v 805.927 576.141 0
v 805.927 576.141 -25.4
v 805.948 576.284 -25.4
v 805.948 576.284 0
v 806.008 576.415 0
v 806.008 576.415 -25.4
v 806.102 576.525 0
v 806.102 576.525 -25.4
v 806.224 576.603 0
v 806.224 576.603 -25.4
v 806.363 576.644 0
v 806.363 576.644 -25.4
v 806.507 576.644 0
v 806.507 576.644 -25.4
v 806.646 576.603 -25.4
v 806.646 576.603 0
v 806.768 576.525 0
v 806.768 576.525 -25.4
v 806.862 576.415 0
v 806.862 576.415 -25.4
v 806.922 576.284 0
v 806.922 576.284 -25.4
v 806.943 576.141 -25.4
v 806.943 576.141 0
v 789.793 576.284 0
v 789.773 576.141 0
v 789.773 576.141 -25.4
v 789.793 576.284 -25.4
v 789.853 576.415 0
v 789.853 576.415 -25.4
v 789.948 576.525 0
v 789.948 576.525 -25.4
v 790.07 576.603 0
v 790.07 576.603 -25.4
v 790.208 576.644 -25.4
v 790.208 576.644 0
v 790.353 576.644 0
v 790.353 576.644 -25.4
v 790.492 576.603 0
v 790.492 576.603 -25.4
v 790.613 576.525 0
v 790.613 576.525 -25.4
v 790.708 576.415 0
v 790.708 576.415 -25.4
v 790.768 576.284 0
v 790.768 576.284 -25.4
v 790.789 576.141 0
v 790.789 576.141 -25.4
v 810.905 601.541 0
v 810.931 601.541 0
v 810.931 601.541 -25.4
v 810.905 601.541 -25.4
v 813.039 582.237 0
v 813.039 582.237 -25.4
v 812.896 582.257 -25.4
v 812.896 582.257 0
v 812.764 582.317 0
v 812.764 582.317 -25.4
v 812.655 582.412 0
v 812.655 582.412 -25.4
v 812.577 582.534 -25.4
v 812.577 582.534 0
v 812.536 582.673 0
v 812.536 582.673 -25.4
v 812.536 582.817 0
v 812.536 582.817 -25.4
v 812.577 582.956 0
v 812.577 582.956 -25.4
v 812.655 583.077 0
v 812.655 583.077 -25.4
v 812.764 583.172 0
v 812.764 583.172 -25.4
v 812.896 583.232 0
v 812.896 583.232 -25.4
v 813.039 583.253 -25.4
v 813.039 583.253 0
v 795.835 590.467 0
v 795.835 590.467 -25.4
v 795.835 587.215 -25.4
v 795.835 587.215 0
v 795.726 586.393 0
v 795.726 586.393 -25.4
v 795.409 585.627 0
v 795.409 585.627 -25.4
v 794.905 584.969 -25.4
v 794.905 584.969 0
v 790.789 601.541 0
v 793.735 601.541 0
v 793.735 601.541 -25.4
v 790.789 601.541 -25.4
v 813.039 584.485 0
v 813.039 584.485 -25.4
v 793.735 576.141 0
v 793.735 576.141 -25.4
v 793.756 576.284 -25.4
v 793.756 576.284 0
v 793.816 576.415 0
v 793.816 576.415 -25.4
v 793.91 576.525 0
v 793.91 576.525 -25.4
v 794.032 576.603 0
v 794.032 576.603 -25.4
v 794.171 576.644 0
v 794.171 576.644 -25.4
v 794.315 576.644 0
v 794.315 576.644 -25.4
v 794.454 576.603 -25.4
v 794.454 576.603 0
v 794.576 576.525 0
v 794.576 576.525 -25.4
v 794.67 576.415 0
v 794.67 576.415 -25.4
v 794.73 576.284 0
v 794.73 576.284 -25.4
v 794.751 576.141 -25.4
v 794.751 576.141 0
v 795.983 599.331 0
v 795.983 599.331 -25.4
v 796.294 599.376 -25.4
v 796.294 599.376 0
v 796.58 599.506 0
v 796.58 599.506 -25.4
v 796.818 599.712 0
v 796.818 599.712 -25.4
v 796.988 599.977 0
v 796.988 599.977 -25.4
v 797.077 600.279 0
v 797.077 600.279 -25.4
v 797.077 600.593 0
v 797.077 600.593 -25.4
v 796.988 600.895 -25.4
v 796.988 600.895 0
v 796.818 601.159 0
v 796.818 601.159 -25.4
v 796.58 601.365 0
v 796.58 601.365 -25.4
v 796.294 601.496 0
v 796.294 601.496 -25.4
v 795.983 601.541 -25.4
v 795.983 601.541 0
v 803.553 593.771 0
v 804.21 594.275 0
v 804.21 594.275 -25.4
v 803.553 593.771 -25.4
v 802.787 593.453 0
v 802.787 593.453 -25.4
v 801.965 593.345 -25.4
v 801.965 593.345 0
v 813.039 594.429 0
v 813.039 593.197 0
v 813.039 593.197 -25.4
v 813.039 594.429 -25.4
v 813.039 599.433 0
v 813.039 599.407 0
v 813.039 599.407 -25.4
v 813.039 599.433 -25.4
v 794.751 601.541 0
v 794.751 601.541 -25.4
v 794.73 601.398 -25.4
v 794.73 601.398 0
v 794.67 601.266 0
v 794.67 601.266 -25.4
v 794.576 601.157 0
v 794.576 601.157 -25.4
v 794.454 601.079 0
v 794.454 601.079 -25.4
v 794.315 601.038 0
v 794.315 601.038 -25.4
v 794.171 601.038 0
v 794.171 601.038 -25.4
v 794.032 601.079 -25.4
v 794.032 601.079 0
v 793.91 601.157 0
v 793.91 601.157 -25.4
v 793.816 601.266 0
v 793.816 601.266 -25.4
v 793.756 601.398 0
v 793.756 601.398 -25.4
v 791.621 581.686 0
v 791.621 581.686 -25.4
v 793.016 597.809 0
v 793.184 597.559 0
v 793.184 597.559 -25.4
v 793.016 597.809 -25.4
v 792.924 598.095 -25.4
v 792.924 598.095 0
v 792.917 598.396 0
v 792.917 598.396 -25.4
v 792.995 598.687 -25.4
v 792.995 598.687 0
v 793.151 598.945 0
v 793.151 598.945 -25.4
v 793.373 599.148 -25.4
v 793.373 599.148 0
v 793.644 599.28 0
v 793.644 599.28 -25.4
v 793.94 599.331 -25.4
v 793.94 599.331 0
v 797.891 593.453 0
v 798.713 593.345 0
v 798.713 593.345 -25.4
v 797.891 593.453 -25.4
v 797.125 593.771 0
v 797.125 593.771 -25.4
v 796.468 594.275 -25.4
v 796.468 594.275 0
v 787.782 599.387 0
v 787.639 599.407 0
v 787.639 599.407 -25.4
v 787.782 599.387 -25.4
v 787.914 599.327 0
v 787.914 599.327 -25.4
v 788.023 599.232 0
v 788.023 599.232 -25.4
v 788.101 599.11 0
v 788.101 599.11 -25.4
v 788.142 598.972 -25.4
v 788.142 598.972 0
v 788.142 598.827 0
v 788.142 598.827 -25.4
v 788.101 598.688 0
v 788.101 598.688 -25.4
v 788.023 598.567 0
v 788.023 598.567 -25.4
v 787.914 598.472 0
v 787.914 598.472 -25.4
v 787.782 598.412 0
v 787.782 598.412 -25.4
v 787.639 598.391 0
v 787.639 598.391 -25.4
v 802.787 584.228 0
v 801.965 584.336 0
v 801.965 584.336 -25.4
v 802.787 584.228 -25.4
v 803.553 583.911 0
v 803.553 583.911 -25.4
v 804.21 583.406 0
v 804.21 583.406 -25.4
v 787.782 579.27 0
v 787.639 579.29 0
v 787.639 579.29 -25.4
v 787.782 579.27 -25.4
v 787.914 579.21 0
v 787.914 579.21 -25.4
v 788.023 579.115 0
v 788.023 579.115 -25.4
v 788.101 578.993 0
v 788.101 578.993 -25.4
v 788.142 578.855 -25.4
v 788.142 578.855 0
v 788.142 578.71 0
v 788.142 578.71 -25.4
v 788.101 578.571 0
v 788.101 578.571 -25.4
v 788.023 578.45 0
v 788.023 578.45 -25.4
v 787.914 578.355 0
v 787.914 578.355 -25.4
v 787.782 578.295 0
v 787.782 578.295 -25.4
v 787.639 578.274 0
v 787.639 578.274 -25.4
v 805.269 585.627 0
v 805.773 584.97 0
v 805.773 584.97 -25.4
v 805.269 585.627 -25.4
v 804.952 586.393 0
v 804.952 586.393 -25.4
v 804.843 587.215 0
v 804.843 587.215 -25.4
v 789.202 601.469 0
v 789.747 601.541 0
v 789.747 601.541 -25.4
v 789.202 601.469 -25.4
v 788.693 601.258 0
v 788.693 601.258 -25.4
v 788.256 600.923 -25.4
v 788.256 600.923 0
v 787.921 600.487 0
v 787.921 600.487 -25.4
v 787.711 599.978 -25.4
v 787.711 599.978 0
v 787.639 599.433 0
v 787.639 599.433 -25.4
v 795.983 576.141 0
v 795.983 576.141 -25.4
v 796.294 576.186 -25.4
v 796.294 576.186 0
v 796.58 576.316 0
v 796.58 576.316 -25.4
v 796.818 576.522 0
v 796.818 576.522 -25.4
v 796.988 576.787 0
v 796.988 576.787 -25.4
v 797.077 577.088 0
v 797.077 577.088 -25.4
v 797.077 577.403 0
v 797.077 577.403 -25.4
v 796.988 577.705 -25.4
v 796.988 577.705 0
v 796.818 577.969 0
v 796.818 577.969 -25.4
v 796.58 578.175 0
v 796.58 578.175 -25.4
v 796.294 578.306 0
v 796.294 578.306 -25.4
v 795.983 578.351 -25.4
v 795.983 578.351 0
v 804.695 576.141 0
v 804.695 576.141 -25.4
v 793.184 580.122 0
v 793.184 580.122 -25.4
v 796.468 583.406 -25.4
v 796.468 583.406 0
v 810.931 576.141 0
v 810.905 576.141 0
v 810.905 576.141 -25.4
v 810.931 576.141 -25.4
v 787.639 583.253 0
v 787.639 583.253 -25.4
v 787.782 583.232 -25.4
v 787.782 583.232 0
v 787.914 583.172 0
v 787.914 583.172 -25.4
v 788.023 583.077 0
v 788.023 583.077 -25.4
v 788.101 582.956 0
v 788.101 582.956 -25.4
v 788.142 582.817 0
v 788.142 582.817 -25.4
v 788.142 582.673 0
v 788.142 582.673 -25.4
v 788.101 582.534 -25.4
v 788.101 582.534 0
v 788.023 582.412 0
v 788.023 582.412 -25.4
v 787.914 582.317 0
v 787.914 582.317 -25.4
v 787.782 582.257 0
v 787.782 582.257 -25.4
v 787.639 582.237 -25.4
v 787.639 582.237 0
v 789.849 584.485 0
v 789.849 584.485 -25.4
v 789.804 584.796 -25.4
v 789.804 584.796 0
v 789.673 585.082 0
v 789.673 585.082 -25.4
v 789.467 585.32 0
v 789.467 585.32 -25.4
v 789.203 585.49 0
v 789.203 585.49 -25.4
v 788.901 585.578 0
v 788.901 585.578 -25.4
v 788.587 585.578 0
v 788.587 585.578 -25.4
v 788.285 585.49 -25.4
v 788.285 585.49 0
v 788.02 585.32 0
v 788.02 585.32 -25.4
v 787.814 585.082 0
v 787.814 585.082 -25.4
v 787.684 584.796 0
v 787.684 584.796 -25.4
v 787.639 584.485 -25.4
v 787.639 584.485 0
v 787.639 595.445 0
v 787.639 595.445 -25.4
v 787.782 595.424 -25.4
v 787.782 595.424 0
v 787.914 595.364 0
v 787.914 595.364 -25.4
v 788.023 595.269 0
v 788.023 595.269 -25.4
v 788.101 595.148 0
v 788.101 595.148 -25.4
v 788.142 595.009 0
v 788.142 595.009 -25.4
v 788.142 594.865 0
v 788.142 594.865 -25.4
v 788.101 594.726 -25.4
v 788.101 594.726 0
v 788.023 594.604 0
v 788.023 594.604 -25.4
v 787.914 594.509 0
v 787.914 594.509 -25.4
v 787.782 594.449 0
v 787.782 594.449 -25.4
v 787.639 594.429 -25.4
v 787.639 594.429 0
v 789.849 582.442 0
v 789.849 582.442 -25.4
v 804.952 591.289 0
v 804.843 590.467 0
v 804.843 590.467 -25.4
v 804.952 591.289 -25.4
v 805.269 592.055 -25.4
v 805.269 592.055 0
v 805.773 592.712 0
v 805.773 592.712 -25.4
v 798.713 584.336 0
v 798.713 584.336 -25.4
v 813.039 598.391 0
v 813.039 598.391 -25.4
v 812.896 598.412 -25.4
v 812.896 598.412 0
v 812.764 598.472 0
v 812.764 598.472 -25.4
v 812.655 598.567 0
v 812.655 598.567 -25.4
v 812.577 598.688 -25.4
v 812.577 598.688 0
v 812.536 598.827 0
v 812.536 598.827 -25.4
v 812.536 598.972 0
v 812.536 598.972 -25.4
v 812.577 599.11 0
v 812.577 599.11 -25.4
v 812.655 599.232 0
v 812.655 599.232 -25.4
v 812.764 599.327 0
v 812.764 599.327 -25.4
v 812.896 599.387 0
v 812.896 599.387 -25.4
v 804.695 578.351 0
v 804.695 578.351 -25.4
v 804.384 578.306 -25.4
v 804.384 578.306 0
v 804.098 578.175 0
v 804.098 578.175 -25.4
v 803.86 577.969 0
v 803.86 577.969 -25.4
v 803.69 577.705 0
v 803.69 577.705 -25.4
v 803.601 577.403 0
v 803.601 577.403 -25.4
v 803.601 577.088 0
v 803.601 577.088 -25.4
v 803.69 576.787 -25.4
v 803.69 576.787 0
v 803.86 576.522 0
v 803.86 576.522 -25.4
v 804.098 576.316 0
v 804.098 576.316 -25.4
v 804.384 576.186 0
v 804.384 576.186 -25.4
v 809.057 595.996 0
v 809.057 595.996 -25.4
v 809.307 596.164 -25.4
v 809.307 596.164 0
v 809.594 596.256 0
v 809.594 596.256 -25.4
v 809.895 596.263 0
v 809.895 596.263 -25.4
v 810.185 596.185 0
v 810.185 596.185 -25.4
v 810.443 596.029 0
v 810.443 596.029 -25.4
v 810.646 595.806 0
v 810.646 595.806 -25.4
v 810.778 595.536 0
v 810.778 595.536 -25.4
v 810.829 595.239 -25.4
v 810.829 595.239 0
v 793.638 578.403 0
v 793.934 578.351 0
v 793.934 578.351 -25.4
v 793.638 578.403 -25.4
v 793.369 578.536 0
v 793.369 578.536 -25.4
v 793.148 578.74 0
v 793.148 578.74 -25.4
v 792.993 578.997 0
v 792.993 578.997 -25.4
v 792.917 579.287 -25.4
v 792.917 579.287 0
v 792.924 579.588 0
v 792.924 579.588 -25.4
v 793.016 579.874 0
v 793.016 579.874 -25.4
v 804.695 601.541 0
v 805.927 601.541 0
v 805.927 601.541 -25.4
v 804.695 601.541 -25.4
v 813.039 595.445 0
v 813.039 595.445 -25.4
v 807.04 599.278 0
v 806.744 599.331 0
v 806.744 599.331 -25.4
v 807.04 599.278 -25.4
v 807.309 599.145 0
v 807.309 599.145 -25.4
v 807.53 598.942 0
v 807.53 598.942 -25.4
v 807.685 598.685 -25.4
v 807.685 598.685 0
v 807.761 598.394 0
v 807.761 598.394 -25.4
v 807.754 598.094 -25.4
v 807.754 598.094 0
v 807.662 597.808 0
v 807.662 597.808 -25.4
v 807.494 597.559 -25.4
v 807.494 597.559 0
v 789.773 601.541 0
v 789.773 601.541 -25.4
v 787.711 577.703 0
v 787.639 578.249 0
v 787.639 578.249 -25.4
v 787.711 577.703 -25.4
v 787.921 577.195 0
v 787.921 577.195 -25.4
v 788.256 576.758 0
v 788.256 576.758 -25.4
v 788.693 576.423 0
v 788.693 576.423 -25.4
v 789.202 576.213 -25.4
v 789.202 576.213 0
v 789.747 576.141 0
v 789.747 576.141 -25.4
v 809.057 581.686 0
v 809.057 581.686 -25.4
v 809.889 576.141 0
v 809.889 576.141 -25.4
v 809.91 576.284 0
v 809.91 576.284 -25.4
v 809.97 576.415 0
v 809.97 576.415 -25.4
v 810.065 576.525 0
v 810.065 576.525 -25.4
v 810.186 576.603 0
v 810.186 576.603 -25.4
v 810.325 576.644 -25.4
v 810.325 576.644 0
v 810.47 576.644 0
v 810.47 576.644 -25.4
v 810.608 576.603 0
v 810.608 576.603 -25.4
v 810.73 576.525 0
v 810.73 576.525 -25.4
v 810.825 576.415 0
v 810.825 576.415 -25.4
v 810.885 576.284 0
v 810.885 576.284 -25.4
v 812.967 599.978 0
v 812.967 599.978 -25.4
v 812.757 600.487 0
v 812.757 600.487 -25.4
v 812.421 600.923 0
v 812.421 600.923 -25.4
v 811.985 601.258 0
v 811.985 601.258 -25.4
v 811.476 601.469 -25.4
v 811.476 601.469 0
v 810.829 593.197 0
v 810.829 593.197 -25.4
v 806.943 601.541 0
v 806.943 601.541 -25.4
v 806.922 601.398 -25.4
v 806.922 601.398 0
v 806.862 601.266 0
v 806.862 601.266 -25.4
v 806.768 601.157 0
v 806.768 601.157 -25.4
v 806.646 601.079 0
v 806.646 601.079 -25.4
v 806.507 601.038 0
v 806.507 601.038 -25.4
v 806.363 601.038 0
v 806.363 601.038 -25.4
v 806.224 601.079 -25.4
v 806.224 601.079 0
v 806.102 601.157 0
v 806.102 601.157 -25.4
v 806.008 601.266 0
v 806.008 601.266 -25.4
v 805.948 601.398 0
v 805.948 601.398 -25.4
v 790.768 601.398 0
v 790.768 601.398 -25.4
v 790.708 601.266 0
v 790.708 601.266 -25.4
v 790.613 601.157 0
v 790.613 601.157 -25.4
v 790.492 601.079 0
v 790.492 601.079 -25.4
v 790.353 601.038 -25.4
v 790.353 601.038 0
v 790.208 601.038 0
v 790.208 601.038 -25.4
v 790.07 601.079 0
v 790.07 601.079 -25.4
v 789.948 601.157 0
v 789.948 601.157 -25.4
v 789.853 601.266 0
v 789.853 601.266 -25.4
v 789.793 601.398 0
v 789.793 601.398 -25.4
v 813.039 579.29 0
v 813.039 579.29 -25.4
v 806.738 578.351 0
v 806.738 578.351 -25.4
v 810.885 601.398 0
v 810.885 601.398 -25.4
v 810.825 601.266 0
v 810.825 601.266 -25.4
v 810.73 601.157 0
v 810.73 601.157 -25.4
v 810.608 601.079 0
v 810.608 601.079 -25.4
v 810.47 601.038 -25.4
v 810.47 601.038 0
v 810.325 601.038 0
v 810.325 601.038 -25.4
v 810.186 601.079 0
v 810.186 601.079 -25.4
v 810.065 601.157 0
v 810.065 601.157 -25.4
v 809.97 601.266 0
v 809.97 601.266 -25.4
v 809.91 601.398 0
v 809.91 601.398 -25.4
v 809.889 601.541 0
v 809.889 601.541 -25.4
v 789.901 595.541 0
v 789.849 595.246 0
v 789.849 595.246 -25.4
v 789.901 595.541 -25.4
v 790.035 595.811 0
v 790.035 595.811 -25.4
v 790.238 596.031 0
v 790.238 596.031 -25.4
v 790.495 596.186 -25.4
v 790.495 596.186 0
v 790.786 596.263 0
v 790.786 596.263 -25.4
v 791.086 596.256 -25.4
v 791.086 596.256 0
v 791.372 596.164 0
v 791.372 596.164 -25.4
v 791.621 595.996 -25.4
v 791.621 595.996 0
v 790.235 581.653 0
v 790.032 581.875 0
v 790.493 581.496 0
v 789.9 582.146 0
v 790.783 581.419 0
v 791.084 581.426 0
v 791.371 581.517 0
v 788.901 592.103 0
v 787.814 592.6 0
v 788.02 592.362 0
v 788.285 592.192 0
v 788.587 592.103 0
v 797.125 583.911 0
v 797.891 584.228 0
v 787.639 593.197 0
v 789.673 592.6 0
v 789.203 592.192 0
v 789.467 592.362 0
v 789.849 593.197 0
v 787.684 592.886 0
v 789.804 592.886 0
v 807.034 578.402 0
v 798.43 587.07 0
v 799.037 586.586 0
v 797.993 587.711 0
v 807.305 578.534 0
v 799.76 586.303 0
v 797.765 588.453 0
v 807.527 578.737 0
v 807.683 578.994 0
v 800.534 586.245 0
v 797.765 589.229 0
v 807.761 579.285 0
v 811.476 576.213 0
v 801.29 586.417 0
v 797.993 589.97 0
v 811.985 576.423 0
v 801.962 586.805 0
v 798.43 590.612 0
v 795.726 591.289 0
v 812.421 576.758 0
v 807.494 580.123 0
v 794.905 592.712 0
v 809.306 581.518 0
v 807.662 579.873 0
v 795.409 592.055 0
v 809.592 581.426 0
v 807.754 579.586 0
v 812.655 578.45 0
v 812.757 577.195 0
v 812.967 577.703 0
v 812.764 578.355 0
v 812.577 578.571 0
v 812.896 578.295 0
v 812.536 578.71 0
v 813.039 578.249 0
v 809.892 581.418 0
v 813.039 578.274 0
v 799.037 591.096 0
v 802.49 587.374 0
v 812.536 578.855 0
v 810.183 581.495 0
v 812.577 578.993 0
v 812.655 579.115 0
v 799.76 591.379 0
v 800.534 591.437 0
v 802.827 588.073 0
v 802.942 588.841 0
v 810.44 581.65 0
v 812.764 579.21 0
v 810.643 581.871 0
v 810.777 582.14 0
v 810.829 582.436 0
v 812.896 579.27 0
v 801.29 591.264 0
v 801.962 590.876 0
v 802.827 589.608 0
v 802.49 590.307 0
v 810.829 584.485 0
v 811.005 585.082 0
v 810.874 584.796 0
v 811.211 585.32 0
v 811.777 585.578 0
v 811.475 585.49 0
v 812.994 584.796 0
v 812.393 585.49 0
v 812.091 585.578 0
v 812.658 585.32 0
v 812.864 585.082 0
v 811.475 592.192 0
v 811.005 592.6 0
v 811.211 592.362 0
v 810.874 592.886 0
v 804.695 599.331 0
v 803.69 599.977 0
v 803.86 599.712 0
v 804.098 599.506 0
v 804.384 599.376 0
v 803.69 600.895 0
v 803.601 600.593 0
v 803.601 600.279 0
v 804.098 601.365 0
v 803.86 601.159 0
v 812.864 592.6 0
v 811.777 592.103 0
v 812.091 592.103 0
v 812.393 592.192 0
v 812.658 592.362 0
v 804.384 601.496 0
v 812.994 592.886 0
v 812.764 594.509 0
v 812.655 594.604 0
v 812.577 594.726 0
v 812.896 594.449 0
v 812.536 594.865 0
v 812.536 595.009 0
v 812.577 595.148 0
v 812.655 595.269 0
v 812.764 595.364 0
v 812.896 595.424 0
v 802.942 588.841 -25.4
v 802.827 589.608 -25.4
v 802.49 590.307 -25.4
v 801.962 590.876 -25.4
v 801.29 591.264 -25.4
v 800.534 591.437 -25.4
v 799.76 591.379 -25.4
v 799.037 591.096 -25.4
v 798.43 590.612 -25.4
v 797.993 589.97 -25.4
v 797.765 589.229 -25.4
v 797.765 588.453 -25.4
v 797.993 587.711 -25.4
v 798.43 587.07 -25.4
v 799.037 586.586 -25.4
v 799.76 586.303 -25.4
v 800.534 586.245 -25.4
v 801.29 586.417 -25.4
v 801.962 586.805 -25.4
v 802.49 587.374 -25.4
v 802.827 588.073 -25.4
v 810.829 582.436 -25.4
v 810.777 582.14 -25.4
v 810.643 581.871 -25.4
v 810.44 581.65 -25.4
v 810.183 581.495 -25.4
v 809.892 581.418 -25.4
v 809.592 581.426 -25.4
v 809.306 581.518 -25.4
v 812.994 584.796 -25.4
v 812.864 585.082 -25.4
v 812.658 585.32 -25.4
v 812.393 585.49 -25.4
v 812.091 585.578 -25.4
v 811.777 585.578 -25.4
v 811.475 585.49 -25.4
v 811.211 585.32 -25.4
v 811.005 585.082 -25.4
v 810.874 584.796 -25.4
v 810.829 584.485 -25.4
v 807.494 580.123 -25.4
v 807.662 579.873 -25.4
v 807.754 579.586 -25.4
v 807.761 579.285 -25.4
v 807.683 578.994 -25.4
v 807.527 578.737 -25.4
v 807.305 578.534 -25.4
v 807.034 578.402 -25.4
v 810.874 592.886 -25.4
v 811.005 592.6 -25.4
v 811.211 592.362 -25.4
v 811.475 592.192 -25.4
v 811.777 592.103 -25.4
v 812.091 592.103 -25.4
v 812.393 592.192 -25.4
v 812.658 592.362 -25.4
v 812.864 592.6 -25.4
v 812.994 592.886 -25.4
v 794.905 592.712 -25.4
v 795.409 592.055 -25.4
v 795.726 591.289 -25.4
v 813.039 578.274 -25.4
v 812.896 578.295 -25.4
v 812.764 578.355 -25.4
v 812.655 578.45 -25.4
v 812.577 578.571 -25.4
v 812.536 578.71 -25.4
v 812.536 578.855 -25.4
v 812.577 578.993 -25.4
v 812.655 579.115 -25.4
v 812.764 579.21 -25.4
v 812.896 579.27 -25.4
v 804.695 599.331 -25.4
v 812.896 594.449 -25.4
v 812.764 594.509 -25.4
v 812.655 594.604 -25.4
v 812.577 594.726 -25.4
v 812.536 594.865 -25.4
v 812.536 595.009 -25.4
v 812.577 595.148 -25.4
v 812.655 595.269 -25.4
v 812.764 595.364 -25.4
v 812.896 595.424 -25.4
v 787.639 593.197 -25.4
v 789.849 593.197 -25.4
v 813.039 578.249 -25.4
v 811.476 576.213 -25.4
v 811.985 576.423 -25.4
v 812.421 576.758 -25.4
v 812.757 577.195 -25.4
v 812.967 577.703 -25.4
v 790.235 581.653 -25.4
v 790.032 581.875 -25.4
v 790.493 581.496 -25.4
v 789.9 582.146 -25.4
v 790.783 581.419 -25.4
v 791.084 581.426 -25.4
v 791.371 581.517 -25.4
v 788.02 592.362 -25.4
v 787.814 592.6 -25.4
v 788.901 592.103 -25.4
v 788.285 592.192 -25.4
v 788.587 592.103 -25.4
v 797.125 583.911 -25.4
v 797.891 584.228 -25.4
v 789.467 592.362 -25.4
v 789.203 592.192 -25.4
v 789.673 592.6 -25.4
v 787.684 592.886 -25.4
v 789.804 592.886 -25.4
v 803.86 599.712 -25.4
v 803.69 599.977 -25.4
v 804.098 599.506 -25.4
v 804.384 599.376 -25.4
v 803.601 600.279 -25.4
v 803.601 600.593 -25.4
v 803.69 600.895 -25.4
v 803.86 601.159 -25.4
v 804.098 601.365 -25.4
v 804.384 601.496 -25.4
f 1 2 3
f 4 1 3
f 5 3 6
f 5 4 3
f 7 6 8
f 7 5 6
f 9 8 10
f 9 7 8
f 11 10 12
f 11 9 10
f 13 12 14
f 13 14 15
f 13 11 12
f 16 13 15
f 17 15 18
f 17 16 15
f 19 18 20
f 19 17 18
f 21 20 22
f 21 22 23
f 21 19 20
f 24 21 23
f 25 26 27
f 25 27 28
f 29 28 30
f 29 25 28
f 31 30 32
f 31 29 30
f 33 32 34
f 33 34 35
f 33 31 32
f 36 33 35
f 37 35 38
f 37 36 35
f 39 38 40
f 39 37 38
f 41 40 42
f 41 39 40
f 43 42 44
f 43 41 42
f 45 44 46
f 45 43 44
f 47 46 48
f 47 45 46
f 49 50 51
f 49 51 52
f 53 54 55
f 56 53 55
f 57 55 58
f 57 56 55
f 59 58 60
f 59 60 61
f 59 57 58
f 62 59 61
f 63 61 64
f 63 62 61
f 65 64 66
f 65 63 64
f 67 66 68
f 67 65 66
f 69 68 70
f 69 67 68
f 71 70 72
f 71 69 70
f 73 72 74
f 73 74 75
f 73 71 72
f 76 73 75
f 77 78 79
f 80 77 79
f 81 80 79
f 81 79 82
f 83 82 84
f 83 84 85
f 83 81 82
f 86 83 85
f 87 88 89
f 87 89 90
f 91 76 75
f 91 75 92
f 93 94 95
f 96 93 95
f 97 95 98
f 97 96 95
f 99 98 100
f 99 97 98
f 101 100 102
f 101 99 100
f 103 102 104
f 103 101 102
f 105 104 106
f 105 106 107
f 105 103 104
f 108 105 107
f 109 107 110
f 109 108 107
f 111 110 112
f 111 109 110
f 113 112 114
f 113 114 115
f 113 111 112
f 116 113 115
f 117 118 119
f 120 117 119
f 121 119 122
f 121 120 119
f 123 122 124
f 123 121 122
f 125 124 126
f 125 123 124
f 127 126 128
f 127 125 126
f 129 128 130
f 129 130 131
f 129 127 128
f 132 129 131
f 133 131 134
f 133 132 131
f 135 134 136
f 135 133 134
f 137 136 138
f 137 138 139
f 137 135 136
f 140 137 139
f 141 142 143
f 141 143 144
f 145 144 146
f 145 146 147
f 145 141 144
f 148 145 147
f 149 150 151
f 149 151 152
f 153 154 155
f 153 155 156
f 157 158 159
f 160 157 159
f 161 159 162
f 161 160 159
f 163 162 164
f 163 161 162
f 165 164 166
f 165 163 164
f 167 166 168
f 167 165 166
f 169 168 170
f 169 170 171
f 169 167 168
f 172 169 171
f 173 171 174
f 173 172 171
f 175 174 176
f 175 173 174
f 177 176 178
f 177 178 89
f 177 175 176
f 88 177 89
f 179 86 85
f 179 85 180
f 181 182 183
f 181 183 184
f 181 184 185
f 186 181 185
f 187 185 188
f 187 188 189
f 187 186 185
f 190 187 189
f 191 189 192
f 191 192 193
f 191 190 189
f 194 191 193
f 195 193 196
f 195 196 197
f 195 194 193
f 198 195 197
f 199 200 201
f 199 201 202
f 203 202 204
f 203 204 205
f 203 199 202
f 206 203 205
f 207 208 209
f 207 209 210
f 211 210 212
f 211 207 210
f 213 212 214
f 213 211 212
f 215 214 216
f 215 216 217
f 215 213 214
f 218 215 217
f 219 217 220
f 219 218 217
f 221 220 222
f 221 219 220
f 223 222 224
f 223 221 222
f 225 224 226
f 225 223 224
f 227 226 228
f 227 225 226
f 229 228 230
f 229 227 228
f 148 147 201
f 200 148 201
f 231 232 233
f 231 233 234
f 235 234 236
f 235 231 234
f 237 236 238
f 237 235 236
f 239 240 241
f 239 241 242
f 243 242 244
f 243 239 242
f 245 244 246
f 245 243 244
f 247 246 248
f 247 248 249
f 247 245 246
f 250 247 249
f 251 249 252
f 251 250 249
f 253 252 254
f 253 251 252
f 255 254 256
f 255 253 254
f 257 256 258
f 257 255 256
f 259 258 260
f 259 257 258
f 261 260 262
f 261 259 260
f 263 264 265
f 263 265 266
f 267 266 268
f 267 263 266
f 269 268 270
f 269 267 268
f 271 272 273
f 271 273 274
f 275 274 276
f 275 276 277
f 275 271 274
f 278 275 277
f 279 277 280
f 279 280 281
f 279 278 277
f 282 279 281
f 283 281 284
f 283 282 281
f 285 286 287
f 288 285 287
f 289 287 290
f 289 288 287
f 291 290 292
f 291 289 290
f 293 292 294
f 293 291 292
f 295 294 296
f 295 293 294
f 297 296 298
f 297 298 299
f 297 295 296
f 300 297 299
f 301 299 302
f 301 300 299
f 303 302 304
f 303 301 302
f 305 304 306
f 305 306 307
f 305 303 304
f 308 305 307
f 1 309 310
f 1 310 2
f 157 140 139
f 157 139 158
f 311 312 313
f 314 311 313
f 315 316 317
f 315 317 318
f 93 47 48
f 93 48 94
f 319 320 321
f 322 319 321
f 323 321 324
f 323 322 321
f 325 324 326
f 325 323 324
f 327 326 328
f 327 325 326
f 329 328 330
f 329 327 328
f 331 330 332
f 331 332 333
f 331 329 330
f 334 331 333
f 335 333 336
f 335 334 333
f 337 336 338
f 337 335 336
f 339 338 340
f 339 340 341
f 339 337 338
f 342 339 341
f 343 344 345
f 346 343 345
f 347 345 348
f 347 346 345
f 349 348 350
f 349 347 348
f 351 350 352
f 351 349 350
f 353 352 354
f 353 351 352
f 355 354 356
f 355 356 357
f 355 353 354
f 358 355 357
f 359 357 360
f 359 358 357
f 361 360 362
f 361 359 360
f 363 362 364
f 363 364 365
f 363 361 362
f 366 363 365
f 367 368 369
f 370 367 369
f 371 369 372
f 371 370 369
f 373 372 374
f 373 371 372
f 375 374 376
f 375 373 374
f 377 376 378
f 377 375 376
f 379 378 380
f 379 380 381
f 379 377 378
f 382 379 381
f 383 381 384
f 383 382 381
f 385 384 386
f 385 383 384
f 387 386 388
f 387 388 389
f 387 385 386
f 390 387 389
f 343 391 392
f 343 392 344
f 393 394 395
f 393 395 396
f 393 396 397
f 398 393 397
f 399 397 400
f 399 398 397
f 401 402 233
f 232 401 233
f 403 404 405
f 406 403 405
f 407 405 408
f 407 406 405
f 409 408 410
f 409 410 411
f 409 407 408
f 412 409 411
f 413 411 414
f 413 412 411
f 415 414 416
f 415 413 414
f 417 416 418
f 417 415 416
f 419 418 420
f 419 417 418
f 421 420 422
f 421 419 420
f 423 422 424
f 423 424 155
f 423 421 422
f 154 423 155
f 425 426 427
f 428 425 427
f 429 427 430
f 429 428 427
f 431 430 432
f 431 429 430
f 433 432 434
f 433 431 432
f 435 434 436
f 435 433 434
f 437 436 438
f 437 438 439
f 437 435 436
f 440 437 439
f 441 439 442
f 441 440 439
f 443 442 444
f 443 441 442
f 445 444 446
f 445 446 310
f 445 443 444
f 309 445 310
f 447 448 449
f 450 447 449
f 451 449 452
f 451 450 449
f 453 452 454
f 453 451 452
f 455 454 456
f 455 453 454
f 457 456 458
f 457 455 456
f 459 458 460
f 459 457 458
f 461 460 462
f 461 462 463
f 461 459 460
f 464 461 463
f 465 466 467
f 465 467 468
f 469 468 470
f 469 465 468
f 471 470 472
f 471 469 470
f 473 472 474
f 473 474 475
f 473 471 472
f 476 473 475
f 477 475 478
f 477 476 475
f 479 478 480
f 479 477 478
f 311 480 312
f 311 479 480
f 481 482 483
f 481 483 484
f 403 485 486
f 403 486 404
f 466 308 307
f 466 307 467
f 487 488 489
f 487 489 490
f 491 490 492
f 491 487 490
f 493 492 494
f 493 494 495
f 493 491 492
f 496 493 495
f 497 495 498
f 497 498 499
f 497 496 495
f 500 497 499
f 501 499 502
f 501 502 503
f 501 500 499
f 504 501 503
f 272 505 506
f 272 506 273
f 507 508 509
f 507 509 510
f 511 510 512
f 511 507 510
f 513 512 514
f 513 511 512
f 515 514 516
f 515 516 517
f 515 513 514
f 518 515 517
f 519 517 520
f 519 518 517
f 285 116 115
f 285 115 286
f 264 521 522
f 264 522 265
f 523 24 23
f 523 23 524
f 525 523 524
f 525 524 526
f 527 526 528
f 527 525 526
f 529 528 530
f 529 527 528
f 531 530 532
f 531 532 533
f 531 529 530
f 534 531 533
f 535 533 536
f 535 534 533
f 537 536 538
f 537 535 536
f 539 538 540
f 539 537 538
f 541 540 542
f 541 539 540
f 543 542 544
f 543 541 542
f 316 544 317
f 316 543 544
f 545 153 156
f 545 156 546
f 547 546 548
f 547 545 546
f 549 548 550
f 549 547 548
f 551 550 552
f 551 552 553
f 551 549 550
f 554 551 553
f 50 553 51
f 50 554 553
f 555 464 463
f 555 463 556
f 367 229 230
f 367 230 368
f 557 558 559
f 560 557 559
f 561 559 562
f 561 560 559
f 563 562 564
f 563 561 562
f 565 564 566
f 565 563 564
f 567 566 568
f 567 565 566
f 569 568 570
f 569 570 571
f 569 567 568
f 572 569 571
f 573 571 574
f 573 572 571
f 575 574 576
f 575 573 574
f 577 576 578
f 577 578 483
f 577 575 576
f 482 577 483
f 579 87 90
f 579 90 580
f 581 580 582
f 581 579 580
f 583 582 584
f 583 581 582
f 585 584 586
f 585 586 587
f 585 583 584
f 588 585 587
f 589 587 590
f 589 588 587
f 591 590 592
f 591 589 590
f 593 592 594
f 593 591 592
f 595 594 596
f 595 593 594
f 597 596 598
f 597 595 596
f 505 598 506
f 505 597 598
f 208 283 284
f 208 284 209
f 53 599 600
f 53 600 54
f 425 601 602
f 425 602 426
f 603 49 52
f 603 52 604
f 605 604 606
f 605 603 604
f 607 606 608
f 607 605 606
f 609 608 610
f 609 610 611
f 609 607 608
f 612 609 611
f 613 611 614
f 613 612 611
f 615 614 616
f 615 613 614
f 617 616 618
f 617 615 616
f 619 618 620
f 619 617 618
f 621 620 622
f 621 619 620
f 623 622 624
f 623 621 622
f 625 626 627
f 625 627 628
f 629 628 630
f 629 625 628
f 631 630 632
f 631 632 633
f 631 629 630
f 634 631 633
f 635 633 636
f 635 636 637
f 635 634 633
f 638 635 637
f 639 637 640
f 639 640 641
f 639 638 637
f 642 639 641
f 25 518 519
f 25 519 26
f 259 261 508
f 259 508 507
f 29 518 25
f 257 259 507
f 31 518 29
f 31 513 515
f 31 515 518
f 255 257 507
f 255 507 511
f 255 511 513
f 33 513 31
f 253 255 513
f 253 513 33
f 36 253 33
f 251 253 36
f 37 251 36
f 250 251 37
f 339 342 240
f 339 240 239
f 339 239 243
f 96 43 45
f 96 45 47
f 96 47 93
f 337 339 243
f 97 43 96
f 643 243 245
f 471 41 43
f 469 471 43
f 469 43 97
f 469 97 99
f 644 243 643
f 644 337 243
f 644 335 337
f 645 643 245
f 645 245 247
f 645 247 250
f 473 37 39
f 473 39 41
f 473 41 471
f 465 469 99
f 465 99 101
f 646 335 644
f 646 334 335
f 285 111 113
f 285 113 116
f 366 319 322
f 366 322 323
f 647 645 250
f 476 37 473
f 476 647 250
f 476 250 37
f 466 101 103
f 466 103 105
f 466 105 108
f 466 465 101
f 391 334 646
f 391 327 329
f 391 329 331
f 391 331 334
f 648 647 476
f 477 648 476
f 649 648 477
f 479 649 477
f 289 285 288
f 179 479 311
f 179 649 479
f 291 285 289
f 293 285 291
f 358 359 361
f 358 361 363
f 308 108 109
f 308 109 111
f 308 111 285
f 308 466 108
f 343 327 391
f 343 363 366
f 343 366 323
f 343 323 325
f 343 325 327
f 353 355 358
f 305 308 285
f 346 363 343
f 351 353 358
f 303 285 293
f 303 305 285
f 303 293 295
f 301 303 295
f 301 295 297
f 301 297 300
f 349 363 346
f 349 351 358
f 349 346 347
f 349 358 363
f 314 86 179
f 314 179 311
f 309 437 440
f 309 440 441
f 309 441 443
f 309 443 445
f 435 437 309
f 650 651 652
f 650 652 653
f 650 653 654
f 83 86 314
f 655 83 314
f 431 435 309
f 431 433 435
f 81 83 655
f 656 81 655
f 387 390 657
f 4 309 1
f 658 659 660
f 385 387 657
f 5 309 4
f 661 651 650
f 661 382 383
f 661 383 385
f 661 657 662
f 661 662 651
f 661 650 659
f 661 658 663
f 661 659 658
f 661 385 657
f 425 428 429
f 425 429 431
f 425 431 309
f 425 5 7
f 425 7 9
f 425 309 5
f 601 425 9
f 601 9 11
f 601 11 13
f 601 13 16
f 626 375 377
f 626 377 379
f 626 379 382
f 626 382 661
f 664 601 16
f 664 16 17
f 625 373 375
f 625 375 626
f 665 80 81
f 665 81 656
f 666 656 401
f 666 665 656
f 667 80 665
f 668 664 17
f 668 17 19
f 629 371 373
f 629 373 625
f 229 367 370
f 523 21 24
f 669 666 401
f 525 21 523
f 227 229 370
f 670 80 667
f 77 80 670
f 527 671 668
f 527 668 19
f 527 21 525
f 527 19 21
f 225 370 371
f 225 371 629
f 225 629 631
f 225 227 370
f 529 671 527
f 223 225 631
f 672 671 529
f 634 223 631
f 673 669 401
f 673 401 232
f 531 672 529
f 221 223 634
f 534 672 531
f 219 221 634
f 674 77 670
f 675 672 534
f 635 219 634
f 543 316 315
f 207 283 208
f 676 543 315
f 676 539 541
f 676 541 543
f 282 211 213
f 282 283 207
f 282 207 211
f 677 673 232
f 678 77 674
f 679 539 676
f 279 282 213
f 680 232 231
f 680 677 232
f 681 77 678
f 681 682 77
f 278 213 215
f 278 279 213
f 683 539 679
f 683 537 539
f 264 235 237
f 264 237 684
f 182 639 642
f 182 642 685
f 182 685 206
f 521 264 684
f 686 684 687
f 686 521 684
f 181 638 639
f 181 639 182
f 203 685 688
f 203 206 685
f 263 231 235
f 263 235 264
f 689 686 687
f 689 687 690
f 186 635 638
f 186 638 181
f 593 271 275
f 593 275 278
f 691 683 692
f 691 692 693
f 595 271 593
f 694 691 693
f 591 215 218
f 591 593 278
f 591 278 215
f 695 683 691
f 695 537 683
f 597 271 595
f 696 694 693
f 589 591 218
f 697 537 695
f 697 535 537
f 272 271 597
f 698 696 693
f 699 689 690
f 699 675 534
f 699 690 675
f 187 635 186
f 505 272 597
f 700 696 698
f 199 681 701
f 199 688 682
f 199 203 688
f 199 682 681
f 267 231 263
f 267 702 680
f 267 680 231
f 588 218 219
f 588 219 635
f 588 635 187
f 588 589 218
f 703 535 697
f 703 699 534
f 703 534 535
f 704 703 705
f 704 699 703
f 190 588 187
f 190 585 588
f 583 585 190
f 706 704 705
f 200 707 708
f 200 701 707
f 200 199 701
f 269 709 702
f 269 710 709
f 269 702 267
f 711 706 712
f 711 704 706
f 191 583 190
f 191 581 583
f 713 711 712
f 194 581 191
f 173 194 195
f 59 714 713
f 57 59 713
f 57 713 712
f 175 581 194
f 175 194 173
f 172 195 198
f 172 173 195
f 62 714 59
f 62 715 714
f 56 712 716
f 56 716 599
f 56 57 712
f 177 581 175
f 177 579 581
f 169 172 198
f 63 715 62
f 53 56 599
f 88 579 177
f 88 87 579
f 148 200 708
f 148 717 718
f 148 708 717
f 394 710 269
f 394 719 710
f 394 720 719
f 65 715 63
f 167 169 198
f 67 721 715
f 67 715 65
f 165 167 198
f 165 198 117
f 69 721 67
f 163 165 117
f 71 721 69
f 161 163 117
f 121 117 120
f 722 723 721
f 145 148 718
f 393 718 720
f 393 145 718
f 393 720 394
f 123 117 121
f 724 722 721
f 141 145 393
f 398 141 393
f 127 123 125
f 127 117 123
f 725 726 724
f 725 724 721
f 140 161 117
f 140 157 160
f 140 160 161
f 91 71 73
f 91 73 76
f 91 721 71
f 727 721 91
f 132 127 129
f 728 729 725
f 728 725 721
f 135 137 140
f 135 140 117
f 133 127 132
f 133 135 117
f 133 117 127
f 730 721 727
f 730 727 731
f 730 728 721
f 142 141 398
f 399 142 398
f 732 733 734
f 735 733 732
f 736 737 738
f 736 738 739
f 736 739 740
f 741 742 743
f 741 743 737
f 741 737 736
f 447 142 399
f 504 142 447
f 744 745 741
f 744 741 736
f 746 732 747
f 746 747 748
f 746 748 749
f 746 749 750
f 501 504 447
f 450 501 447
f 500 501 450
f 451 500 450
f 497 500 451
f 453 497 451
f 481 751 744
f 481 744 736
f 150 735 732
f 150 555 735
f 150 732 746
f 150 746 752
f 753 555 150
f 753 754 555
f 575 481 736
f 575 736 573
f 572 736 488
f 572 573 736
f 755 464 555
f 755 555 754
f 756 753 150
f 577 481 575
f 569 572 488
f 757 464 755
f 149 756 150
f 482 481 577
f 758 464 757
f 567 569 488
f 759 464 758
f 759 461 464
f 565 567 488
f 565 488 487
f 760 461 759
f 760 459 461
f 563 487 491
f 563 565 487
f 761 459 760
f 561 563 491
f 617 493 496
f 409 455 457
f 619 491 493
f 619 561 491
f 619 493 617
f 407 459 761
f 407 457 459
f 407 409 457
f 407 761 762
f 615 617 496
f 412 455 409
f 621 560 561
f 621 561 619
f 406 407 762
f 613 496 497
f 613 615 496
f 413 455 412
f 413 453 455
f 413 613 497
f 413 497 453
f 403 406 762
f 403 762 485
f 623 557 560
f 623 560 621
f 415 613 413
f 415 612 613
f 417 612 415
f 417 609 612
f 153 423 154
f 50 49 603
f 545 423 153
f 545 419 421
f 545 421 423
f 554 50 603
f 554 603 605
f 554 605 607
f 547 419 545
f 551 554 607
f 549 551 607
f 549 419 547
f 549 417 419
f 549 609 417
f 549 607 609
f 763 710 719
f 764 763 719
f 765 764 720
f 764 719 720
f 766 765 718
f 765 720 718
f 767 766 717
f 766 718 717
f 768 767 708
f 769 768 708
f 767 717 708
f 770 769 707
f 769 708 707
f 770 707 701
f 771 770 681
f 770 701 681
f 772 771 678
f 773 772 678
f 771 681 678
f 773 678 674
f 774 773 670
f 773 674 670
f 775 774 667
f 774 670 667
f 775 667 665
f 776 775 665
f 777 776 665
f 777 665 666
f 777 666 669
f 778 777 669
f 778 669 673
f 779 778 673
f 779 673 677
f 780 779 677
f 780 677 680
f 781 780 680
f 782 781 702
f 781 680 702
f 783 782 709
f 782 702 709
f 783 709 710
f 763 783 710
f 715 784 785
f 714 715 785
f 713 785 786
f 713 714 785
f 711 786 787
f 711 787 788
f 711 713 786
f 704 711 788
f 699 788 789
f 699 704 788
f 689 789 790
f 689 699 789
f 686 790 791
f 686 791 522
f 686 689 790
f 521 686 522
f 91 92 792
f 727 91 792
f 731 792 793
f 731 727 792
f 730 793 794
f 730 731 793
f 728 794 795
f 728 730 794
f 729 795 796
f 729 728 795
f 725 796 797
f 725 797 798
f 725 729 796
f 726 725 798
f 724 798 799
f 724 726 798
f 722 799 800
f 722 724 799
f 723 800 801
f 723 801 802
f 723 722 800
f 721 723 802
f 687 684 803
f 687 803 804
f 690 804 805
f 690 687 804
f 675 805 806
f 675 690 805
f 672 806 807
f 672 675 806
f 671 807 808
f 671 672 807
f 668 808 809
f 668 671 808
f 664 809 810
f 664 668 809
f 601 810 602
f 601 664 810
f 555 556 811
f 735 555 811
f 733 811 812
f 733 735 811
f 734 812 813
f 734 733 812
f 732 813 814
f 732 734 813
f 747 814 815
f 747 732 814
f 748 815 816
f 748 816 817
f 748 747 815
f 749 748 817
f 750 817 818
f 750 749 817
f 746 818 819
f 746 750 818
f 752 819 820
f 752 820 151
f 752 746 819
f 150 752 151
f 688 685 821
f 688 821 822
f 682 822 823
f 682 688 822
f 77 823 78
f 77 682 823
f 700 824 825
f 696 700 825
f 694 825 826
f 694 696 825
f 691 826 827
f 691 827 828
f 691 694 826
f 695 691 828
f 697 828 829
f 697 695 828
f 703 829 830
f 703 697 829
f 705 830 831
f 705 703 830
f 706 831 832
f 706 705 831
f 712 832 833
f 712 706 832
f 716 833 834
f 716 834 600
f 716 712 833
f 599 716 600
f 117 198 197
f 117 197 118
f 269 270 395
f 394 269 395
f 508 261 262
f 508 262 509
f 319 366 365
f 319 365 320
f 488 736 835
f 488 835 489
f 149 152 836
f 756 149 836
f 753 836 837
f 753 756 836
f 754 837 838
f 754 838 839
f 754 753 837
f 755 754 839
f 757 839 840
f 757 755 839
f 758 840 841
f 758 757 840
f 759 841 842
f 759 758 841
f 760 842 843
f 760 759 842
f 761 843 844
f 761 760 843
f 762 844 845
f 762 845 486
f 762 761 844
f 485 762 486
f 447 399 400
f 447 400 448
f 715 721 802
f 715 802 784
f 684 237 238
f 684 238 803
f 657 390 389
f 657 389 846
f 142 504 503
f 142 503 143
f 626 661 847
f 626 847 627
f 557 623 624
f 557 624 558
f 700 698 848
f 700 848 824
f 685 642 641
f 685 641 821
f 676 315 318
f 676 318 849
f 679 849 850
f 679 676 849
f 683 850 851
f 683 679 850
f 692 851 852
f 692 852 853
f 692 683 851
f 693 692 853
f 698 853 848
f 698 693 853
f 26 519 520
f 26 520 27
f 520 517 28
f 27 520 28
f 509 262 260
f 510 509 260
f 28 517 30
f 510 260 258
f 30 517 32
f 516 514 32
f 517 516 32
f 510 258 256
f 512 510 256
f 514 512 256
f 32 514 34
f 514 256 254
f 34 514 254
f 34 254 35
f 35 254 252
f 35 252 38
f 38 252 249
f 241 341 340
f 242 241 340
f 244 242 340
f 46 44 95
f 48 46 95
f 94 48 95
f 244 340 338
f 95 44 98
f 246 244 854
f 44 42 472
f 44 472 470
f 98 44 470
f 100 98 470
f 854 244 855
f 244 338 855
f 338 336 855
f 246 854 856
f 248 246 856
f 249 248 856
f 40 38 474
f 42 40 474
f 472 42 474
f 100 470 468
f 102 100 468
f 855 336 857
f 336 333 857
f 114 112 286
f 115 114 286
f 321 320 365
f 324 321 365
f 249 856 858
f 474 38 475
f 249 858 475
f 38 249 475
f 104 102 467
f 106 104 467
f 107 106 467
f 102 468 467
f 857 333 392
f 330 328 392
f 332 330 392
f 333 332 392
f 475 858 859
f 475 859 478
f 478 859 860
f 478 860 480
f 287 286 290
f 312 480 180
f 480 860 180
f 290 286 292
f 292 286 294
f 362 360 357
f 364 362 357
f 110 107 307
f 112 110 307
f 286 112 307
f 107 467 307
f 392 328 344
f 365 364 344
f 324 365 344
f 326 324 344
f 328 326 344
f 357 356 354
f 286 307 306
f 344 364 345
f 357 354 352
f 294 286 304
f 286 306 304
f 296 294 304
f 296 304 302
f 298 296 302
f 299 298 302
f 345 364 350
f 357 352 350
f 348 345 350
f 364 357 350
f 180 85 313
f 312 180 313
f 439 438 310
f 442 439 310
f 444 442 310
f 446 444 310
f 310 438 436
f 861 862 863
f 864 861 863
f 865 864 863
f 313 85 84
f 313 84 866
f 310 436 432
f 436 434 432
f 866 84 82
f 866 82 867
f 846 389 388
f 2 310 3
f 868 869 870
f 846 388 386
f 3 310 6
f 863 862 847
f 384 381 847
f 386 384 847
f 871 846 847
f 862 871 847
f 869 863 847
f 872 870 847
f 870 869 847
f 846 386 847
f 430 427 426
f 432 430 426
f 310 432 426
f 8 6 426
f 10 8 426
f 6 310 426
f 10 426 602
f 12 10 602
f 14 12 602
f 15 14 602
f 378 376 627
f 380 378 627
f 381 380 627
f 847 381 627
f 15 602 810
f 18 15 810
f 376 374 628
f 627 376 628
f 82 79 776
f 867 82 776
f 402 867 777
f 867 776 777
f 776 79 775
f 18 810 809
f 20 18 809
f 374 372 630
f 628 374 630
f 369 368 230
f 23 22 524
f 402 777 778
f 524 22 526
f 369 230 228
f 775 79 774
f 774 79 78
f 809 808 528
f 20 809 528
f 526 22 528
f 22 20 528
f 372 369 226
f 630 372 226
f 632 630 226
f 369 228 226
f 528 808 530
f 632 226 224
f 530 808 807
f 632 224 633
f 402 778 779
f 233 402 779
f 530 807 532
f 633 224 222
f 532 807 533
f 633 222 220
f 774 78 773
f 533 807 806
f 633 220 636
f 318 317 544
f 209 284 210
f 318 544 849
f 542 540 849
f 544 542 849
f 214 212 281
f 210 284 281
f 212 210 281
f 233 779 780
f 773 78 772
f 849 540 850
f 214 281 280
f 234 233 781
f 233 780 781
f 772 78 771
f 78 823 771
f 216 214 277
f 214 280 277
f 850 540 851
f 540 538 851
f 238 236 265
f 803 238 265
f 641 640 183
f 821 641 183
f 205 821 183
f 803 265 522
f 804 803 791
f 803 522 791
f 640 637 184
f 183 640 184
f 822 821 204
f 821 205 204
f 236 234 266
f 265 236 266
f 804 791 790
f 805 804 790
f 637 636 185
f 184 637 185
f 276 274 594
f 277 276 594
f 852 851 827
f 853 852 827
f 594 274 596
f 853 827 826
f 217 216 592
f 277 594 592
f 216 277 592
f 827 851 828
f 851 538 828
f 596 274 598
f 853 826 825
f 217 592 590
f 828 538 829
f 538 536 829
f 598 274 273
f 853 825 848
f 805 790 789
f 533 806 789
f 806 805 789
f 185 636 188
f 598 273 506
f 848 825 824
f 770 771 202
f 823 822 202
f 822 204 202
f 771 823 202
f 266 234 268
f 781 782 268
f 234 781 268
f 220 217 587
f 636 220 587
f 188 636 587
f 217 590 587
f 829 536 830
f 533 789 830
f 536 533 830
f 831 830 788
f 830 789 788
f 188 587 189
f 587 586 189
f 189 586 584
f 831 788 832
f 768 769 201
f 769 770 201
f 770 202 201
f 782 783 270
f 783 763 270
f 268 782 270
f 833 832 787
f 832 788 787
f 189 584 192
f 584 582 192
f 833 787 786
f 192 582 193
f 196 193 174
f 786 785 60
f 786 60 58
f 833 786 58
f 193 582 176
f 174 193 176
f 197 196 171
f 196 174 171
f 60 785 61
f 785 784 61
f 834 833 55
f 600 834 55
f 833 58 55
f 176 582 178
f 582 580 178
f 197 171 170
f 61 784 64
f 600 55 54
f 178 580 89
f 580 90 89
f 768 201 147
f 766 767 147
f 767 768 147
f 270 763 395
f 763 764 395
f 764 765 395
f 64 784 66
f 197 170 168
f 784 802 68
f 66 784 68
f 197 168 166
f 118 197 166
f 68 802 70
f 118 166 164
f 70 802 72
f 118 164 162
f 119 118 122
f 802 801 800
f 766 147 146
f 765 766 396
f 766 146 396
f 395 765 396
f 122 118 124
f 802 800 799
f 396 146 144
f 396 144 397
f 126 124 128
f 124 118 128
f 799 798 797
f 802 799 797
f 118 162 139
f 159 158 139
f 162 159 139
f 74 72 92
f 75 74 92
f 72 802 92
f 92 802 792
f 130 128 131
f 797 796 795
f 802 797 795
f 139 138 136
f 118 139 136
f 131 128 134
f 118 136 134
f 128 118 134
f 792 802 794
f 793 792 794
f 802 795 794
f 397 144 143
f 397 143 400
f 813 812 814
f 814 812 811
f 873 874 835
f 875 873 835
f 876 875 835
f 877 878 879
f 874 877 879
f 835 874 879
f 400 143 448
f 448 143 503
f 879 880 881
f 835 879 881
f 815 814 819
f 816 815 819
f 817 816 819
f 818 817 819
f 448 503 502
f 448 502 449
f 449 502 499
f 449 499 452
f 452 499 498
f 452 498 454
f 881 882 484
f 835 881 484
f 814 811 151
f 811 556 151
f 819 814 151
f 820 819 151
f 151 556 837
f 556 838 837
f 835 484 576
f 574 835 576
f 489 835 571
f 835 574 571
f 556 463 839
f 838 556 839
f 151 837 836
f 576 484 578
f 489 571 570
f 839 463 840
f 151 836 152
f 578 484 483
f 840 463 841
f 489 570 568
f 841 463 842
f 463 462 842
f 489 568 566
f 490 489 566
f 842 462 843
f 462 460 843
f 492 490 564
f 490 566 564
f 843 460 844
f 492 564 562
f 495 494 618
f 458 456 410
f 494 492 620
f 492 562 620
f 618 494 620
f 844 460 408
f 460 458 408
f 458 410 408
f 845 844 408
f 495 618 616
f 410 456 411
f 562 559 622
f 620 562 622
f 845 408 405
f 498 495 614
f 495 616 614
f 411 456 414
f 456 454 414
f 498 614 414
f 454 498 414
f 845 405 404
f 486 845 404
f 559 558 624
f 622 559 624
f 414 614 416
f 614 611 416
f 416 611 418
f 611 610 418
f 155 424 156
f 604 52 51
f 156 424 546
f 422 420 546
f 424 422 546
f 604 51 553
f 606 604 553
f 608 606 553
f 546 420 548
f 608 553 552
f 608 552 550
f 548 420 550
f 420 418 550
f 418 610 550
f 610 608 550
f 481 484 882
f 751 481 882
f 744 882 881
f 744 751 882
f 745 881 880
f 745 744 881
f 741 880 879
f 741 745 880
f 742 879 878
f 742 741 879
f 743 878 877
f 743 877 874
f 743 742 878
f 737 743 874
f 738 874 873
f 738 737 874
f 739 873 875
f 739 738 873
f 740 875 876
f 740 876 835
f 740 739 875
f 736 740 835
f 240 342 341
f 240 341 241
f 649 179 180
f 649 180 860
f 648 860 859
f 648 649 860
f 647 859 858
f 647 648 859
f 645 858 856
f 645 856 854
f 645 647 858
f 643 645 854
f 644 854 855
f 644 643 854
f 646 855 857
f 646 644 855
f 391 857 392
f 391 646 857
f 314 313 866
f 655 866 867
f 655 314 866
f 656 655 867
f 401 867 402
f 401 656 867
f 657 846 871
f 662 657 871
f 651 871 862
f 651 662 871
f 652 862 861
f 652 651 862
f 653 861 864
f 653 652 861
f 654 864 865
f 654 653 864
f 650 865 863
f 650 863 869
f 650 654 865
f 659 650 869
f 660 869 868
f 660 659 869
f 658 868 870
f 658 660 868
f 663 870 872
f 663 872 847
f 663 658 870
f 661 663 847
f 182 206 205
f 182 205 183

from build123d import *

# Parameters (mm, degrees)
SKETCH1_R      = 2.6035
EXTRUDE1_DEPTH = 25.4


with BuildPart() as part:
    # Sketch1 → Extrude1 (new body)
    with BuildSketch(Plane.XY):
        with BuildLine():
            Line((813.038976674, 579.290424026), (813.038976674, 582.236824026))
            ThreePointArc((813.038976674, 582.236824026), (812.530976674, 582.744824026), (813.038976674, 583.252824026))
            Line((813.038976674, 583.252824026), (813.038976674, 584.484724026))
            ThreePointArc((813.038976674, 584.484724026), (811.934076674, 585.589624026), (810.829176674, 584.484724026))
            Line((810.829176674, 584.484724026), (810.829176674, 582.435874947))
            ThreePointArc((810.829176674, 582.435874947), (810.182743454, 581.495163196), (809.057340701, 581.685644565))
            Line((809.057340701, 581.685644565), (805.773323088, 584.969563516))
            ThreePointArc((805.773323088, 584.969563516), (805.085045004, 585.999619341), (804.843353394, 587.214661271))
            Line((804.843353394, 587.214661271), (804.843353394, 590.467068589))
            ThreePointArc((804.843353394, 590.467068589), (805.085043572, 591.682107061), (805.773317796, 592.712161052))
            Line((805.773317796, 592.712161052), (809.057121325, 595.995881407))
            ThreePointArc((809.057121325, 595.995881407), (810.18544278, 596.185153907), (810.829176674, 595.239352628))
            Line((810.829176674, 595.239352628), (810.829176674, 593.196924026))
            ThreePointArc((810.829176674, 593.196924026), (811.934076674, 592.092024026), (813.038976674, 593.196924026))
            Line((813.038976674, 593.196924026), (813.038976674, 594.428824026))
            ThreePointArc((813.038976674, 594.428824026), (812.530976674, 594.936824026), (813.038976674, 595.444824026))
            Line((813.038976674, 595.444824026), (813.038976674, 598.391224026))
            ThreePointArc((813.038976674, 598.391224026), (812.530976674, 598.899224026), (813.038976674, 599.407224026))
            Line((813.038976674, 599.407224026), (813.038976674, 599.432624026))
            ThreePointArc((813.038976674, 599.432624026), (812.42149919, 600.923346542), (810.930776674, 601.540824026))
            Line((810.930776674, 601.540824026), (810.905376674, 601.540824026))
            ThreePointArc((810.905376674, 601.540824026), (810.397376674, 601.032824026), (809.889376674, 601.540824026))
            Line((809.889376674, 601.540824026), (806.942976674, 601.540824026))
            ThreePointArc((806.942976674, 601.540824026), (806.434976674, 601.032824026), (805.926976674, 601.540824026))
            Line((805.926976674, 601.540824026), (804.695076674, 601.540824026))
            ThreePointArc((804.695076674, 601.540824026), (803.590176674, 600.435924026), (804.695076674, 599.331024026))
            Line((804.695076674, 599.331024026), (806.743925753, 599.331024026))
            ThreePointArc((806.743925753, 599.331024026), (807.684637504, 598.684590806), (807.494156135, 597.559188053))
            Line((807.494156135, 597.559188053), (804.210237184, 594.27517044))
            ThreePointArc((804.210237184, 594.27517044), (803.180181359, 593.586892356), (801.965139429, 593.345200745))
            Line((801.965139429, 593.345200745), (798.712732111, 593.345200745))
            ThreePointArc((798.712732111, 593.345200745), (797.497693639, 593.586890924), (796.467639648, 594.275165148))
            Line((796.467639648, 594.275165148), (793.183919293, 597.558968677))
            ThreePointArc((793.183919293, 597.558968677), (792.994646793, 598.687290132), (793.940448072, 599.331024026))
            Line((793.940448072, 599.331024026), (795.982876674, 599.331024026))
            ThreePointArc((795.982876674, 599.331024026), (797.087776674, 600.435924026), (795.982876674, 601.540824026))
            Line((795.982876674, 601.540824026), (794.750976674, 601.540824026))
            ThreePointArc((794.750976674, 601.540824026), (794.242976674, 601.032824026), (793.734976674, 601.540824026))
            Line((793.734976674, 601.540824026), (790.788576674, 601.540824026))
            ThreePointArc((790.788576674, 601.540824026), (790.280576674, 601.032824026), (789.772576674, 601.540824026))
            Line((789.772576674, 601.540824026), (789.747176674, 601.540824026))
            ThreePointArc((789.747176674, 601.540824026), (788.256454158, 600.923346542), (787.638976674, 599.432624026))
            Line((787.638976674, 599.432624026), (787.638976674, 599.407224026))
            ThreePointArc((787.638976674, 599.407224026), (788.146976674, 598.899224026), (787.638976674, 598.391224026))
            Line((787.638976674, 598.391224026), (787.638976674, 595.444824026))
            ThreePointArc((787.638976674, 595.444824026), (788.146976674, 594.936824026), (787.638976674, 594.428824026))
            Line((787.638976674, 594.428824026), (787.638976674, 593.196924026))
            ThreePointArc((787.638976674, 593.196924026), (788.743876674, 592.092024026), (789.848776674, 593.196924026))
            Line((789.848776674, 593.196924026), (789.848776674, 595.245773105))
            ThreePointArc((789.848776674, 595.245773105), (790.495209894, 596.186484856), (791.620612647, 595.996003487))
            Line((791.620612647, 595.996003487), (794.90463026, 592.712084536))
            ThreePointArc((794.90463026, 592.712084536), (795.592908344, 591.682028711), (795.834599954, 590.466986781))
            Line((795.834599954, 590.466986781), (795.834599954, 587.214579463))
            ThreePointArc((795.834599954, 587.214579463), (795.592909776, 585.999540991), (794.904635552, 584.969487))
            Line((794.904635552, 584.969487), (791.620832022, 581.685766645))
            ThreePointArc((791.620832022, 581.685766645), (790.492510568, 581.496494145), (789.848776674, 582.442295424))
            Line((789.848776674, 582.442295424), (789.848776674, 584.484724026))
            ThreePointArc((789.848776674, 584.484724026), (788.743876674, 585.589624026), (787.638976674, 584.484724026))
            Line((787.638976674, 584.484724026), (787.638976674, 583.252824026))
            ThreePointArc((787.638976674, 583.252824026), (788.146976674, 582.744824026), (787.638976674, 582.236824026))
            Line((787.638976674, 582.236824026), (787.638976674, 579.290424026))
            ThreePointArc((787.638976674, 579.290424026), (788.146976674, 578.782424026), (787.638976674, 578.274424026))
            Line((787.638976674, 578.274424026), (787.638976674, 578.249024026))
            ThreePointArc((787.638976674, 578.249024026), (788.256454158, 576.75830151), (789.747176674, 576.140824026))
            Line((789.747176674, 576.140824026), (789.772576674, 576.140824026))
            ThreePointArc((789.772576674, 576.140824026), (790.280576674, 576.648824026), (790.788576674, 576.140824026))
            Line((790.788576674, 576.140824026), (793.734976674, 576.140824026))
            ThreePointArc((793.734976674, 576.140824026), (794.242976674, 576.648824026), (794.750976674, 576.140824026))
            Line((794.750976674, 576.140824026), (795.982876674, 576.140824026))
            ThreePointArc((795.982876674, 576.140824026), (797.087776674, 577.245724026), (795.982876674, 578.350624026))
            Line((795.982876674, 578.350624026), (793.934027595, 578.350624026))
            ThreePointArc((793.934027595, 578.350624026), (792.993315844, 578.997057246), (793.183797213, 580.122459999))
            Line((793.183797213, 580.122459999), (796.467716164, 583.406477612))
            ThreePointArc((796.467716164, 583.406477612), (797.497771989, 584.094755696), (798.712813919, 584.336447306))
            Line((798.712813919, 584.336447306), (801.965221237, 584.336447306))
            ThreePointArc((801.965221237, 584.336447306), (803.180259709, 584.094757128), (804.2103137, 583.406482904))
            Line((804.2103137, 583.406482904), (807.494034055, 580.122679374))
            ThreePointArc((807.494034055, 580.122679374), (807.683306555, 578.99435792), (806.737505276, 578.350624026))
            Line((806.737505276, 578.350624026), (804.695076674, 578.350624026))
            ThreePointArc((804.695076674, 578.350624026), (803.590176674, 577.245724026), (804.695076674, 576.140824026))
            Line((804.695076674, 576.140824026), (805.926976674, 576.140824026))
            ThreePointArc((805.926976674, 576.140824026), (806.434976674, 576.648824026), (806.942976674, 576.140824026))
            Line((806.942976674, 576.140824026), (809.889376674, 576.140824026))
            ThreePointArc((809.889376674, 576.140824026), (810.397376674, 576.648824026), (810.905376674, 576.140824026))
            Line((810.905376674, 576.140824026), (810.930776674, 576.140824026))
            ThreePointArc((810.930776674, 576.140824026), (812.42149919, 576.75830151), (813.038976674, 578.249024026))
            Line((813.038976674, 578.249024026), (813.038976674, 578.274424026))
            ThreePointArc((813.038976674, 578.274424026), (812.530976674, 578.782424026), (813.038976674, 579.290424026))
        make_face()
        with Locations((800.338976674, 588.840824026)):
            Circle(SKETCH1_R, mode=Mode.SUBTRACT)
    extrude(amount=-EXTRUDE1_DEPTH)


solid = part.part
